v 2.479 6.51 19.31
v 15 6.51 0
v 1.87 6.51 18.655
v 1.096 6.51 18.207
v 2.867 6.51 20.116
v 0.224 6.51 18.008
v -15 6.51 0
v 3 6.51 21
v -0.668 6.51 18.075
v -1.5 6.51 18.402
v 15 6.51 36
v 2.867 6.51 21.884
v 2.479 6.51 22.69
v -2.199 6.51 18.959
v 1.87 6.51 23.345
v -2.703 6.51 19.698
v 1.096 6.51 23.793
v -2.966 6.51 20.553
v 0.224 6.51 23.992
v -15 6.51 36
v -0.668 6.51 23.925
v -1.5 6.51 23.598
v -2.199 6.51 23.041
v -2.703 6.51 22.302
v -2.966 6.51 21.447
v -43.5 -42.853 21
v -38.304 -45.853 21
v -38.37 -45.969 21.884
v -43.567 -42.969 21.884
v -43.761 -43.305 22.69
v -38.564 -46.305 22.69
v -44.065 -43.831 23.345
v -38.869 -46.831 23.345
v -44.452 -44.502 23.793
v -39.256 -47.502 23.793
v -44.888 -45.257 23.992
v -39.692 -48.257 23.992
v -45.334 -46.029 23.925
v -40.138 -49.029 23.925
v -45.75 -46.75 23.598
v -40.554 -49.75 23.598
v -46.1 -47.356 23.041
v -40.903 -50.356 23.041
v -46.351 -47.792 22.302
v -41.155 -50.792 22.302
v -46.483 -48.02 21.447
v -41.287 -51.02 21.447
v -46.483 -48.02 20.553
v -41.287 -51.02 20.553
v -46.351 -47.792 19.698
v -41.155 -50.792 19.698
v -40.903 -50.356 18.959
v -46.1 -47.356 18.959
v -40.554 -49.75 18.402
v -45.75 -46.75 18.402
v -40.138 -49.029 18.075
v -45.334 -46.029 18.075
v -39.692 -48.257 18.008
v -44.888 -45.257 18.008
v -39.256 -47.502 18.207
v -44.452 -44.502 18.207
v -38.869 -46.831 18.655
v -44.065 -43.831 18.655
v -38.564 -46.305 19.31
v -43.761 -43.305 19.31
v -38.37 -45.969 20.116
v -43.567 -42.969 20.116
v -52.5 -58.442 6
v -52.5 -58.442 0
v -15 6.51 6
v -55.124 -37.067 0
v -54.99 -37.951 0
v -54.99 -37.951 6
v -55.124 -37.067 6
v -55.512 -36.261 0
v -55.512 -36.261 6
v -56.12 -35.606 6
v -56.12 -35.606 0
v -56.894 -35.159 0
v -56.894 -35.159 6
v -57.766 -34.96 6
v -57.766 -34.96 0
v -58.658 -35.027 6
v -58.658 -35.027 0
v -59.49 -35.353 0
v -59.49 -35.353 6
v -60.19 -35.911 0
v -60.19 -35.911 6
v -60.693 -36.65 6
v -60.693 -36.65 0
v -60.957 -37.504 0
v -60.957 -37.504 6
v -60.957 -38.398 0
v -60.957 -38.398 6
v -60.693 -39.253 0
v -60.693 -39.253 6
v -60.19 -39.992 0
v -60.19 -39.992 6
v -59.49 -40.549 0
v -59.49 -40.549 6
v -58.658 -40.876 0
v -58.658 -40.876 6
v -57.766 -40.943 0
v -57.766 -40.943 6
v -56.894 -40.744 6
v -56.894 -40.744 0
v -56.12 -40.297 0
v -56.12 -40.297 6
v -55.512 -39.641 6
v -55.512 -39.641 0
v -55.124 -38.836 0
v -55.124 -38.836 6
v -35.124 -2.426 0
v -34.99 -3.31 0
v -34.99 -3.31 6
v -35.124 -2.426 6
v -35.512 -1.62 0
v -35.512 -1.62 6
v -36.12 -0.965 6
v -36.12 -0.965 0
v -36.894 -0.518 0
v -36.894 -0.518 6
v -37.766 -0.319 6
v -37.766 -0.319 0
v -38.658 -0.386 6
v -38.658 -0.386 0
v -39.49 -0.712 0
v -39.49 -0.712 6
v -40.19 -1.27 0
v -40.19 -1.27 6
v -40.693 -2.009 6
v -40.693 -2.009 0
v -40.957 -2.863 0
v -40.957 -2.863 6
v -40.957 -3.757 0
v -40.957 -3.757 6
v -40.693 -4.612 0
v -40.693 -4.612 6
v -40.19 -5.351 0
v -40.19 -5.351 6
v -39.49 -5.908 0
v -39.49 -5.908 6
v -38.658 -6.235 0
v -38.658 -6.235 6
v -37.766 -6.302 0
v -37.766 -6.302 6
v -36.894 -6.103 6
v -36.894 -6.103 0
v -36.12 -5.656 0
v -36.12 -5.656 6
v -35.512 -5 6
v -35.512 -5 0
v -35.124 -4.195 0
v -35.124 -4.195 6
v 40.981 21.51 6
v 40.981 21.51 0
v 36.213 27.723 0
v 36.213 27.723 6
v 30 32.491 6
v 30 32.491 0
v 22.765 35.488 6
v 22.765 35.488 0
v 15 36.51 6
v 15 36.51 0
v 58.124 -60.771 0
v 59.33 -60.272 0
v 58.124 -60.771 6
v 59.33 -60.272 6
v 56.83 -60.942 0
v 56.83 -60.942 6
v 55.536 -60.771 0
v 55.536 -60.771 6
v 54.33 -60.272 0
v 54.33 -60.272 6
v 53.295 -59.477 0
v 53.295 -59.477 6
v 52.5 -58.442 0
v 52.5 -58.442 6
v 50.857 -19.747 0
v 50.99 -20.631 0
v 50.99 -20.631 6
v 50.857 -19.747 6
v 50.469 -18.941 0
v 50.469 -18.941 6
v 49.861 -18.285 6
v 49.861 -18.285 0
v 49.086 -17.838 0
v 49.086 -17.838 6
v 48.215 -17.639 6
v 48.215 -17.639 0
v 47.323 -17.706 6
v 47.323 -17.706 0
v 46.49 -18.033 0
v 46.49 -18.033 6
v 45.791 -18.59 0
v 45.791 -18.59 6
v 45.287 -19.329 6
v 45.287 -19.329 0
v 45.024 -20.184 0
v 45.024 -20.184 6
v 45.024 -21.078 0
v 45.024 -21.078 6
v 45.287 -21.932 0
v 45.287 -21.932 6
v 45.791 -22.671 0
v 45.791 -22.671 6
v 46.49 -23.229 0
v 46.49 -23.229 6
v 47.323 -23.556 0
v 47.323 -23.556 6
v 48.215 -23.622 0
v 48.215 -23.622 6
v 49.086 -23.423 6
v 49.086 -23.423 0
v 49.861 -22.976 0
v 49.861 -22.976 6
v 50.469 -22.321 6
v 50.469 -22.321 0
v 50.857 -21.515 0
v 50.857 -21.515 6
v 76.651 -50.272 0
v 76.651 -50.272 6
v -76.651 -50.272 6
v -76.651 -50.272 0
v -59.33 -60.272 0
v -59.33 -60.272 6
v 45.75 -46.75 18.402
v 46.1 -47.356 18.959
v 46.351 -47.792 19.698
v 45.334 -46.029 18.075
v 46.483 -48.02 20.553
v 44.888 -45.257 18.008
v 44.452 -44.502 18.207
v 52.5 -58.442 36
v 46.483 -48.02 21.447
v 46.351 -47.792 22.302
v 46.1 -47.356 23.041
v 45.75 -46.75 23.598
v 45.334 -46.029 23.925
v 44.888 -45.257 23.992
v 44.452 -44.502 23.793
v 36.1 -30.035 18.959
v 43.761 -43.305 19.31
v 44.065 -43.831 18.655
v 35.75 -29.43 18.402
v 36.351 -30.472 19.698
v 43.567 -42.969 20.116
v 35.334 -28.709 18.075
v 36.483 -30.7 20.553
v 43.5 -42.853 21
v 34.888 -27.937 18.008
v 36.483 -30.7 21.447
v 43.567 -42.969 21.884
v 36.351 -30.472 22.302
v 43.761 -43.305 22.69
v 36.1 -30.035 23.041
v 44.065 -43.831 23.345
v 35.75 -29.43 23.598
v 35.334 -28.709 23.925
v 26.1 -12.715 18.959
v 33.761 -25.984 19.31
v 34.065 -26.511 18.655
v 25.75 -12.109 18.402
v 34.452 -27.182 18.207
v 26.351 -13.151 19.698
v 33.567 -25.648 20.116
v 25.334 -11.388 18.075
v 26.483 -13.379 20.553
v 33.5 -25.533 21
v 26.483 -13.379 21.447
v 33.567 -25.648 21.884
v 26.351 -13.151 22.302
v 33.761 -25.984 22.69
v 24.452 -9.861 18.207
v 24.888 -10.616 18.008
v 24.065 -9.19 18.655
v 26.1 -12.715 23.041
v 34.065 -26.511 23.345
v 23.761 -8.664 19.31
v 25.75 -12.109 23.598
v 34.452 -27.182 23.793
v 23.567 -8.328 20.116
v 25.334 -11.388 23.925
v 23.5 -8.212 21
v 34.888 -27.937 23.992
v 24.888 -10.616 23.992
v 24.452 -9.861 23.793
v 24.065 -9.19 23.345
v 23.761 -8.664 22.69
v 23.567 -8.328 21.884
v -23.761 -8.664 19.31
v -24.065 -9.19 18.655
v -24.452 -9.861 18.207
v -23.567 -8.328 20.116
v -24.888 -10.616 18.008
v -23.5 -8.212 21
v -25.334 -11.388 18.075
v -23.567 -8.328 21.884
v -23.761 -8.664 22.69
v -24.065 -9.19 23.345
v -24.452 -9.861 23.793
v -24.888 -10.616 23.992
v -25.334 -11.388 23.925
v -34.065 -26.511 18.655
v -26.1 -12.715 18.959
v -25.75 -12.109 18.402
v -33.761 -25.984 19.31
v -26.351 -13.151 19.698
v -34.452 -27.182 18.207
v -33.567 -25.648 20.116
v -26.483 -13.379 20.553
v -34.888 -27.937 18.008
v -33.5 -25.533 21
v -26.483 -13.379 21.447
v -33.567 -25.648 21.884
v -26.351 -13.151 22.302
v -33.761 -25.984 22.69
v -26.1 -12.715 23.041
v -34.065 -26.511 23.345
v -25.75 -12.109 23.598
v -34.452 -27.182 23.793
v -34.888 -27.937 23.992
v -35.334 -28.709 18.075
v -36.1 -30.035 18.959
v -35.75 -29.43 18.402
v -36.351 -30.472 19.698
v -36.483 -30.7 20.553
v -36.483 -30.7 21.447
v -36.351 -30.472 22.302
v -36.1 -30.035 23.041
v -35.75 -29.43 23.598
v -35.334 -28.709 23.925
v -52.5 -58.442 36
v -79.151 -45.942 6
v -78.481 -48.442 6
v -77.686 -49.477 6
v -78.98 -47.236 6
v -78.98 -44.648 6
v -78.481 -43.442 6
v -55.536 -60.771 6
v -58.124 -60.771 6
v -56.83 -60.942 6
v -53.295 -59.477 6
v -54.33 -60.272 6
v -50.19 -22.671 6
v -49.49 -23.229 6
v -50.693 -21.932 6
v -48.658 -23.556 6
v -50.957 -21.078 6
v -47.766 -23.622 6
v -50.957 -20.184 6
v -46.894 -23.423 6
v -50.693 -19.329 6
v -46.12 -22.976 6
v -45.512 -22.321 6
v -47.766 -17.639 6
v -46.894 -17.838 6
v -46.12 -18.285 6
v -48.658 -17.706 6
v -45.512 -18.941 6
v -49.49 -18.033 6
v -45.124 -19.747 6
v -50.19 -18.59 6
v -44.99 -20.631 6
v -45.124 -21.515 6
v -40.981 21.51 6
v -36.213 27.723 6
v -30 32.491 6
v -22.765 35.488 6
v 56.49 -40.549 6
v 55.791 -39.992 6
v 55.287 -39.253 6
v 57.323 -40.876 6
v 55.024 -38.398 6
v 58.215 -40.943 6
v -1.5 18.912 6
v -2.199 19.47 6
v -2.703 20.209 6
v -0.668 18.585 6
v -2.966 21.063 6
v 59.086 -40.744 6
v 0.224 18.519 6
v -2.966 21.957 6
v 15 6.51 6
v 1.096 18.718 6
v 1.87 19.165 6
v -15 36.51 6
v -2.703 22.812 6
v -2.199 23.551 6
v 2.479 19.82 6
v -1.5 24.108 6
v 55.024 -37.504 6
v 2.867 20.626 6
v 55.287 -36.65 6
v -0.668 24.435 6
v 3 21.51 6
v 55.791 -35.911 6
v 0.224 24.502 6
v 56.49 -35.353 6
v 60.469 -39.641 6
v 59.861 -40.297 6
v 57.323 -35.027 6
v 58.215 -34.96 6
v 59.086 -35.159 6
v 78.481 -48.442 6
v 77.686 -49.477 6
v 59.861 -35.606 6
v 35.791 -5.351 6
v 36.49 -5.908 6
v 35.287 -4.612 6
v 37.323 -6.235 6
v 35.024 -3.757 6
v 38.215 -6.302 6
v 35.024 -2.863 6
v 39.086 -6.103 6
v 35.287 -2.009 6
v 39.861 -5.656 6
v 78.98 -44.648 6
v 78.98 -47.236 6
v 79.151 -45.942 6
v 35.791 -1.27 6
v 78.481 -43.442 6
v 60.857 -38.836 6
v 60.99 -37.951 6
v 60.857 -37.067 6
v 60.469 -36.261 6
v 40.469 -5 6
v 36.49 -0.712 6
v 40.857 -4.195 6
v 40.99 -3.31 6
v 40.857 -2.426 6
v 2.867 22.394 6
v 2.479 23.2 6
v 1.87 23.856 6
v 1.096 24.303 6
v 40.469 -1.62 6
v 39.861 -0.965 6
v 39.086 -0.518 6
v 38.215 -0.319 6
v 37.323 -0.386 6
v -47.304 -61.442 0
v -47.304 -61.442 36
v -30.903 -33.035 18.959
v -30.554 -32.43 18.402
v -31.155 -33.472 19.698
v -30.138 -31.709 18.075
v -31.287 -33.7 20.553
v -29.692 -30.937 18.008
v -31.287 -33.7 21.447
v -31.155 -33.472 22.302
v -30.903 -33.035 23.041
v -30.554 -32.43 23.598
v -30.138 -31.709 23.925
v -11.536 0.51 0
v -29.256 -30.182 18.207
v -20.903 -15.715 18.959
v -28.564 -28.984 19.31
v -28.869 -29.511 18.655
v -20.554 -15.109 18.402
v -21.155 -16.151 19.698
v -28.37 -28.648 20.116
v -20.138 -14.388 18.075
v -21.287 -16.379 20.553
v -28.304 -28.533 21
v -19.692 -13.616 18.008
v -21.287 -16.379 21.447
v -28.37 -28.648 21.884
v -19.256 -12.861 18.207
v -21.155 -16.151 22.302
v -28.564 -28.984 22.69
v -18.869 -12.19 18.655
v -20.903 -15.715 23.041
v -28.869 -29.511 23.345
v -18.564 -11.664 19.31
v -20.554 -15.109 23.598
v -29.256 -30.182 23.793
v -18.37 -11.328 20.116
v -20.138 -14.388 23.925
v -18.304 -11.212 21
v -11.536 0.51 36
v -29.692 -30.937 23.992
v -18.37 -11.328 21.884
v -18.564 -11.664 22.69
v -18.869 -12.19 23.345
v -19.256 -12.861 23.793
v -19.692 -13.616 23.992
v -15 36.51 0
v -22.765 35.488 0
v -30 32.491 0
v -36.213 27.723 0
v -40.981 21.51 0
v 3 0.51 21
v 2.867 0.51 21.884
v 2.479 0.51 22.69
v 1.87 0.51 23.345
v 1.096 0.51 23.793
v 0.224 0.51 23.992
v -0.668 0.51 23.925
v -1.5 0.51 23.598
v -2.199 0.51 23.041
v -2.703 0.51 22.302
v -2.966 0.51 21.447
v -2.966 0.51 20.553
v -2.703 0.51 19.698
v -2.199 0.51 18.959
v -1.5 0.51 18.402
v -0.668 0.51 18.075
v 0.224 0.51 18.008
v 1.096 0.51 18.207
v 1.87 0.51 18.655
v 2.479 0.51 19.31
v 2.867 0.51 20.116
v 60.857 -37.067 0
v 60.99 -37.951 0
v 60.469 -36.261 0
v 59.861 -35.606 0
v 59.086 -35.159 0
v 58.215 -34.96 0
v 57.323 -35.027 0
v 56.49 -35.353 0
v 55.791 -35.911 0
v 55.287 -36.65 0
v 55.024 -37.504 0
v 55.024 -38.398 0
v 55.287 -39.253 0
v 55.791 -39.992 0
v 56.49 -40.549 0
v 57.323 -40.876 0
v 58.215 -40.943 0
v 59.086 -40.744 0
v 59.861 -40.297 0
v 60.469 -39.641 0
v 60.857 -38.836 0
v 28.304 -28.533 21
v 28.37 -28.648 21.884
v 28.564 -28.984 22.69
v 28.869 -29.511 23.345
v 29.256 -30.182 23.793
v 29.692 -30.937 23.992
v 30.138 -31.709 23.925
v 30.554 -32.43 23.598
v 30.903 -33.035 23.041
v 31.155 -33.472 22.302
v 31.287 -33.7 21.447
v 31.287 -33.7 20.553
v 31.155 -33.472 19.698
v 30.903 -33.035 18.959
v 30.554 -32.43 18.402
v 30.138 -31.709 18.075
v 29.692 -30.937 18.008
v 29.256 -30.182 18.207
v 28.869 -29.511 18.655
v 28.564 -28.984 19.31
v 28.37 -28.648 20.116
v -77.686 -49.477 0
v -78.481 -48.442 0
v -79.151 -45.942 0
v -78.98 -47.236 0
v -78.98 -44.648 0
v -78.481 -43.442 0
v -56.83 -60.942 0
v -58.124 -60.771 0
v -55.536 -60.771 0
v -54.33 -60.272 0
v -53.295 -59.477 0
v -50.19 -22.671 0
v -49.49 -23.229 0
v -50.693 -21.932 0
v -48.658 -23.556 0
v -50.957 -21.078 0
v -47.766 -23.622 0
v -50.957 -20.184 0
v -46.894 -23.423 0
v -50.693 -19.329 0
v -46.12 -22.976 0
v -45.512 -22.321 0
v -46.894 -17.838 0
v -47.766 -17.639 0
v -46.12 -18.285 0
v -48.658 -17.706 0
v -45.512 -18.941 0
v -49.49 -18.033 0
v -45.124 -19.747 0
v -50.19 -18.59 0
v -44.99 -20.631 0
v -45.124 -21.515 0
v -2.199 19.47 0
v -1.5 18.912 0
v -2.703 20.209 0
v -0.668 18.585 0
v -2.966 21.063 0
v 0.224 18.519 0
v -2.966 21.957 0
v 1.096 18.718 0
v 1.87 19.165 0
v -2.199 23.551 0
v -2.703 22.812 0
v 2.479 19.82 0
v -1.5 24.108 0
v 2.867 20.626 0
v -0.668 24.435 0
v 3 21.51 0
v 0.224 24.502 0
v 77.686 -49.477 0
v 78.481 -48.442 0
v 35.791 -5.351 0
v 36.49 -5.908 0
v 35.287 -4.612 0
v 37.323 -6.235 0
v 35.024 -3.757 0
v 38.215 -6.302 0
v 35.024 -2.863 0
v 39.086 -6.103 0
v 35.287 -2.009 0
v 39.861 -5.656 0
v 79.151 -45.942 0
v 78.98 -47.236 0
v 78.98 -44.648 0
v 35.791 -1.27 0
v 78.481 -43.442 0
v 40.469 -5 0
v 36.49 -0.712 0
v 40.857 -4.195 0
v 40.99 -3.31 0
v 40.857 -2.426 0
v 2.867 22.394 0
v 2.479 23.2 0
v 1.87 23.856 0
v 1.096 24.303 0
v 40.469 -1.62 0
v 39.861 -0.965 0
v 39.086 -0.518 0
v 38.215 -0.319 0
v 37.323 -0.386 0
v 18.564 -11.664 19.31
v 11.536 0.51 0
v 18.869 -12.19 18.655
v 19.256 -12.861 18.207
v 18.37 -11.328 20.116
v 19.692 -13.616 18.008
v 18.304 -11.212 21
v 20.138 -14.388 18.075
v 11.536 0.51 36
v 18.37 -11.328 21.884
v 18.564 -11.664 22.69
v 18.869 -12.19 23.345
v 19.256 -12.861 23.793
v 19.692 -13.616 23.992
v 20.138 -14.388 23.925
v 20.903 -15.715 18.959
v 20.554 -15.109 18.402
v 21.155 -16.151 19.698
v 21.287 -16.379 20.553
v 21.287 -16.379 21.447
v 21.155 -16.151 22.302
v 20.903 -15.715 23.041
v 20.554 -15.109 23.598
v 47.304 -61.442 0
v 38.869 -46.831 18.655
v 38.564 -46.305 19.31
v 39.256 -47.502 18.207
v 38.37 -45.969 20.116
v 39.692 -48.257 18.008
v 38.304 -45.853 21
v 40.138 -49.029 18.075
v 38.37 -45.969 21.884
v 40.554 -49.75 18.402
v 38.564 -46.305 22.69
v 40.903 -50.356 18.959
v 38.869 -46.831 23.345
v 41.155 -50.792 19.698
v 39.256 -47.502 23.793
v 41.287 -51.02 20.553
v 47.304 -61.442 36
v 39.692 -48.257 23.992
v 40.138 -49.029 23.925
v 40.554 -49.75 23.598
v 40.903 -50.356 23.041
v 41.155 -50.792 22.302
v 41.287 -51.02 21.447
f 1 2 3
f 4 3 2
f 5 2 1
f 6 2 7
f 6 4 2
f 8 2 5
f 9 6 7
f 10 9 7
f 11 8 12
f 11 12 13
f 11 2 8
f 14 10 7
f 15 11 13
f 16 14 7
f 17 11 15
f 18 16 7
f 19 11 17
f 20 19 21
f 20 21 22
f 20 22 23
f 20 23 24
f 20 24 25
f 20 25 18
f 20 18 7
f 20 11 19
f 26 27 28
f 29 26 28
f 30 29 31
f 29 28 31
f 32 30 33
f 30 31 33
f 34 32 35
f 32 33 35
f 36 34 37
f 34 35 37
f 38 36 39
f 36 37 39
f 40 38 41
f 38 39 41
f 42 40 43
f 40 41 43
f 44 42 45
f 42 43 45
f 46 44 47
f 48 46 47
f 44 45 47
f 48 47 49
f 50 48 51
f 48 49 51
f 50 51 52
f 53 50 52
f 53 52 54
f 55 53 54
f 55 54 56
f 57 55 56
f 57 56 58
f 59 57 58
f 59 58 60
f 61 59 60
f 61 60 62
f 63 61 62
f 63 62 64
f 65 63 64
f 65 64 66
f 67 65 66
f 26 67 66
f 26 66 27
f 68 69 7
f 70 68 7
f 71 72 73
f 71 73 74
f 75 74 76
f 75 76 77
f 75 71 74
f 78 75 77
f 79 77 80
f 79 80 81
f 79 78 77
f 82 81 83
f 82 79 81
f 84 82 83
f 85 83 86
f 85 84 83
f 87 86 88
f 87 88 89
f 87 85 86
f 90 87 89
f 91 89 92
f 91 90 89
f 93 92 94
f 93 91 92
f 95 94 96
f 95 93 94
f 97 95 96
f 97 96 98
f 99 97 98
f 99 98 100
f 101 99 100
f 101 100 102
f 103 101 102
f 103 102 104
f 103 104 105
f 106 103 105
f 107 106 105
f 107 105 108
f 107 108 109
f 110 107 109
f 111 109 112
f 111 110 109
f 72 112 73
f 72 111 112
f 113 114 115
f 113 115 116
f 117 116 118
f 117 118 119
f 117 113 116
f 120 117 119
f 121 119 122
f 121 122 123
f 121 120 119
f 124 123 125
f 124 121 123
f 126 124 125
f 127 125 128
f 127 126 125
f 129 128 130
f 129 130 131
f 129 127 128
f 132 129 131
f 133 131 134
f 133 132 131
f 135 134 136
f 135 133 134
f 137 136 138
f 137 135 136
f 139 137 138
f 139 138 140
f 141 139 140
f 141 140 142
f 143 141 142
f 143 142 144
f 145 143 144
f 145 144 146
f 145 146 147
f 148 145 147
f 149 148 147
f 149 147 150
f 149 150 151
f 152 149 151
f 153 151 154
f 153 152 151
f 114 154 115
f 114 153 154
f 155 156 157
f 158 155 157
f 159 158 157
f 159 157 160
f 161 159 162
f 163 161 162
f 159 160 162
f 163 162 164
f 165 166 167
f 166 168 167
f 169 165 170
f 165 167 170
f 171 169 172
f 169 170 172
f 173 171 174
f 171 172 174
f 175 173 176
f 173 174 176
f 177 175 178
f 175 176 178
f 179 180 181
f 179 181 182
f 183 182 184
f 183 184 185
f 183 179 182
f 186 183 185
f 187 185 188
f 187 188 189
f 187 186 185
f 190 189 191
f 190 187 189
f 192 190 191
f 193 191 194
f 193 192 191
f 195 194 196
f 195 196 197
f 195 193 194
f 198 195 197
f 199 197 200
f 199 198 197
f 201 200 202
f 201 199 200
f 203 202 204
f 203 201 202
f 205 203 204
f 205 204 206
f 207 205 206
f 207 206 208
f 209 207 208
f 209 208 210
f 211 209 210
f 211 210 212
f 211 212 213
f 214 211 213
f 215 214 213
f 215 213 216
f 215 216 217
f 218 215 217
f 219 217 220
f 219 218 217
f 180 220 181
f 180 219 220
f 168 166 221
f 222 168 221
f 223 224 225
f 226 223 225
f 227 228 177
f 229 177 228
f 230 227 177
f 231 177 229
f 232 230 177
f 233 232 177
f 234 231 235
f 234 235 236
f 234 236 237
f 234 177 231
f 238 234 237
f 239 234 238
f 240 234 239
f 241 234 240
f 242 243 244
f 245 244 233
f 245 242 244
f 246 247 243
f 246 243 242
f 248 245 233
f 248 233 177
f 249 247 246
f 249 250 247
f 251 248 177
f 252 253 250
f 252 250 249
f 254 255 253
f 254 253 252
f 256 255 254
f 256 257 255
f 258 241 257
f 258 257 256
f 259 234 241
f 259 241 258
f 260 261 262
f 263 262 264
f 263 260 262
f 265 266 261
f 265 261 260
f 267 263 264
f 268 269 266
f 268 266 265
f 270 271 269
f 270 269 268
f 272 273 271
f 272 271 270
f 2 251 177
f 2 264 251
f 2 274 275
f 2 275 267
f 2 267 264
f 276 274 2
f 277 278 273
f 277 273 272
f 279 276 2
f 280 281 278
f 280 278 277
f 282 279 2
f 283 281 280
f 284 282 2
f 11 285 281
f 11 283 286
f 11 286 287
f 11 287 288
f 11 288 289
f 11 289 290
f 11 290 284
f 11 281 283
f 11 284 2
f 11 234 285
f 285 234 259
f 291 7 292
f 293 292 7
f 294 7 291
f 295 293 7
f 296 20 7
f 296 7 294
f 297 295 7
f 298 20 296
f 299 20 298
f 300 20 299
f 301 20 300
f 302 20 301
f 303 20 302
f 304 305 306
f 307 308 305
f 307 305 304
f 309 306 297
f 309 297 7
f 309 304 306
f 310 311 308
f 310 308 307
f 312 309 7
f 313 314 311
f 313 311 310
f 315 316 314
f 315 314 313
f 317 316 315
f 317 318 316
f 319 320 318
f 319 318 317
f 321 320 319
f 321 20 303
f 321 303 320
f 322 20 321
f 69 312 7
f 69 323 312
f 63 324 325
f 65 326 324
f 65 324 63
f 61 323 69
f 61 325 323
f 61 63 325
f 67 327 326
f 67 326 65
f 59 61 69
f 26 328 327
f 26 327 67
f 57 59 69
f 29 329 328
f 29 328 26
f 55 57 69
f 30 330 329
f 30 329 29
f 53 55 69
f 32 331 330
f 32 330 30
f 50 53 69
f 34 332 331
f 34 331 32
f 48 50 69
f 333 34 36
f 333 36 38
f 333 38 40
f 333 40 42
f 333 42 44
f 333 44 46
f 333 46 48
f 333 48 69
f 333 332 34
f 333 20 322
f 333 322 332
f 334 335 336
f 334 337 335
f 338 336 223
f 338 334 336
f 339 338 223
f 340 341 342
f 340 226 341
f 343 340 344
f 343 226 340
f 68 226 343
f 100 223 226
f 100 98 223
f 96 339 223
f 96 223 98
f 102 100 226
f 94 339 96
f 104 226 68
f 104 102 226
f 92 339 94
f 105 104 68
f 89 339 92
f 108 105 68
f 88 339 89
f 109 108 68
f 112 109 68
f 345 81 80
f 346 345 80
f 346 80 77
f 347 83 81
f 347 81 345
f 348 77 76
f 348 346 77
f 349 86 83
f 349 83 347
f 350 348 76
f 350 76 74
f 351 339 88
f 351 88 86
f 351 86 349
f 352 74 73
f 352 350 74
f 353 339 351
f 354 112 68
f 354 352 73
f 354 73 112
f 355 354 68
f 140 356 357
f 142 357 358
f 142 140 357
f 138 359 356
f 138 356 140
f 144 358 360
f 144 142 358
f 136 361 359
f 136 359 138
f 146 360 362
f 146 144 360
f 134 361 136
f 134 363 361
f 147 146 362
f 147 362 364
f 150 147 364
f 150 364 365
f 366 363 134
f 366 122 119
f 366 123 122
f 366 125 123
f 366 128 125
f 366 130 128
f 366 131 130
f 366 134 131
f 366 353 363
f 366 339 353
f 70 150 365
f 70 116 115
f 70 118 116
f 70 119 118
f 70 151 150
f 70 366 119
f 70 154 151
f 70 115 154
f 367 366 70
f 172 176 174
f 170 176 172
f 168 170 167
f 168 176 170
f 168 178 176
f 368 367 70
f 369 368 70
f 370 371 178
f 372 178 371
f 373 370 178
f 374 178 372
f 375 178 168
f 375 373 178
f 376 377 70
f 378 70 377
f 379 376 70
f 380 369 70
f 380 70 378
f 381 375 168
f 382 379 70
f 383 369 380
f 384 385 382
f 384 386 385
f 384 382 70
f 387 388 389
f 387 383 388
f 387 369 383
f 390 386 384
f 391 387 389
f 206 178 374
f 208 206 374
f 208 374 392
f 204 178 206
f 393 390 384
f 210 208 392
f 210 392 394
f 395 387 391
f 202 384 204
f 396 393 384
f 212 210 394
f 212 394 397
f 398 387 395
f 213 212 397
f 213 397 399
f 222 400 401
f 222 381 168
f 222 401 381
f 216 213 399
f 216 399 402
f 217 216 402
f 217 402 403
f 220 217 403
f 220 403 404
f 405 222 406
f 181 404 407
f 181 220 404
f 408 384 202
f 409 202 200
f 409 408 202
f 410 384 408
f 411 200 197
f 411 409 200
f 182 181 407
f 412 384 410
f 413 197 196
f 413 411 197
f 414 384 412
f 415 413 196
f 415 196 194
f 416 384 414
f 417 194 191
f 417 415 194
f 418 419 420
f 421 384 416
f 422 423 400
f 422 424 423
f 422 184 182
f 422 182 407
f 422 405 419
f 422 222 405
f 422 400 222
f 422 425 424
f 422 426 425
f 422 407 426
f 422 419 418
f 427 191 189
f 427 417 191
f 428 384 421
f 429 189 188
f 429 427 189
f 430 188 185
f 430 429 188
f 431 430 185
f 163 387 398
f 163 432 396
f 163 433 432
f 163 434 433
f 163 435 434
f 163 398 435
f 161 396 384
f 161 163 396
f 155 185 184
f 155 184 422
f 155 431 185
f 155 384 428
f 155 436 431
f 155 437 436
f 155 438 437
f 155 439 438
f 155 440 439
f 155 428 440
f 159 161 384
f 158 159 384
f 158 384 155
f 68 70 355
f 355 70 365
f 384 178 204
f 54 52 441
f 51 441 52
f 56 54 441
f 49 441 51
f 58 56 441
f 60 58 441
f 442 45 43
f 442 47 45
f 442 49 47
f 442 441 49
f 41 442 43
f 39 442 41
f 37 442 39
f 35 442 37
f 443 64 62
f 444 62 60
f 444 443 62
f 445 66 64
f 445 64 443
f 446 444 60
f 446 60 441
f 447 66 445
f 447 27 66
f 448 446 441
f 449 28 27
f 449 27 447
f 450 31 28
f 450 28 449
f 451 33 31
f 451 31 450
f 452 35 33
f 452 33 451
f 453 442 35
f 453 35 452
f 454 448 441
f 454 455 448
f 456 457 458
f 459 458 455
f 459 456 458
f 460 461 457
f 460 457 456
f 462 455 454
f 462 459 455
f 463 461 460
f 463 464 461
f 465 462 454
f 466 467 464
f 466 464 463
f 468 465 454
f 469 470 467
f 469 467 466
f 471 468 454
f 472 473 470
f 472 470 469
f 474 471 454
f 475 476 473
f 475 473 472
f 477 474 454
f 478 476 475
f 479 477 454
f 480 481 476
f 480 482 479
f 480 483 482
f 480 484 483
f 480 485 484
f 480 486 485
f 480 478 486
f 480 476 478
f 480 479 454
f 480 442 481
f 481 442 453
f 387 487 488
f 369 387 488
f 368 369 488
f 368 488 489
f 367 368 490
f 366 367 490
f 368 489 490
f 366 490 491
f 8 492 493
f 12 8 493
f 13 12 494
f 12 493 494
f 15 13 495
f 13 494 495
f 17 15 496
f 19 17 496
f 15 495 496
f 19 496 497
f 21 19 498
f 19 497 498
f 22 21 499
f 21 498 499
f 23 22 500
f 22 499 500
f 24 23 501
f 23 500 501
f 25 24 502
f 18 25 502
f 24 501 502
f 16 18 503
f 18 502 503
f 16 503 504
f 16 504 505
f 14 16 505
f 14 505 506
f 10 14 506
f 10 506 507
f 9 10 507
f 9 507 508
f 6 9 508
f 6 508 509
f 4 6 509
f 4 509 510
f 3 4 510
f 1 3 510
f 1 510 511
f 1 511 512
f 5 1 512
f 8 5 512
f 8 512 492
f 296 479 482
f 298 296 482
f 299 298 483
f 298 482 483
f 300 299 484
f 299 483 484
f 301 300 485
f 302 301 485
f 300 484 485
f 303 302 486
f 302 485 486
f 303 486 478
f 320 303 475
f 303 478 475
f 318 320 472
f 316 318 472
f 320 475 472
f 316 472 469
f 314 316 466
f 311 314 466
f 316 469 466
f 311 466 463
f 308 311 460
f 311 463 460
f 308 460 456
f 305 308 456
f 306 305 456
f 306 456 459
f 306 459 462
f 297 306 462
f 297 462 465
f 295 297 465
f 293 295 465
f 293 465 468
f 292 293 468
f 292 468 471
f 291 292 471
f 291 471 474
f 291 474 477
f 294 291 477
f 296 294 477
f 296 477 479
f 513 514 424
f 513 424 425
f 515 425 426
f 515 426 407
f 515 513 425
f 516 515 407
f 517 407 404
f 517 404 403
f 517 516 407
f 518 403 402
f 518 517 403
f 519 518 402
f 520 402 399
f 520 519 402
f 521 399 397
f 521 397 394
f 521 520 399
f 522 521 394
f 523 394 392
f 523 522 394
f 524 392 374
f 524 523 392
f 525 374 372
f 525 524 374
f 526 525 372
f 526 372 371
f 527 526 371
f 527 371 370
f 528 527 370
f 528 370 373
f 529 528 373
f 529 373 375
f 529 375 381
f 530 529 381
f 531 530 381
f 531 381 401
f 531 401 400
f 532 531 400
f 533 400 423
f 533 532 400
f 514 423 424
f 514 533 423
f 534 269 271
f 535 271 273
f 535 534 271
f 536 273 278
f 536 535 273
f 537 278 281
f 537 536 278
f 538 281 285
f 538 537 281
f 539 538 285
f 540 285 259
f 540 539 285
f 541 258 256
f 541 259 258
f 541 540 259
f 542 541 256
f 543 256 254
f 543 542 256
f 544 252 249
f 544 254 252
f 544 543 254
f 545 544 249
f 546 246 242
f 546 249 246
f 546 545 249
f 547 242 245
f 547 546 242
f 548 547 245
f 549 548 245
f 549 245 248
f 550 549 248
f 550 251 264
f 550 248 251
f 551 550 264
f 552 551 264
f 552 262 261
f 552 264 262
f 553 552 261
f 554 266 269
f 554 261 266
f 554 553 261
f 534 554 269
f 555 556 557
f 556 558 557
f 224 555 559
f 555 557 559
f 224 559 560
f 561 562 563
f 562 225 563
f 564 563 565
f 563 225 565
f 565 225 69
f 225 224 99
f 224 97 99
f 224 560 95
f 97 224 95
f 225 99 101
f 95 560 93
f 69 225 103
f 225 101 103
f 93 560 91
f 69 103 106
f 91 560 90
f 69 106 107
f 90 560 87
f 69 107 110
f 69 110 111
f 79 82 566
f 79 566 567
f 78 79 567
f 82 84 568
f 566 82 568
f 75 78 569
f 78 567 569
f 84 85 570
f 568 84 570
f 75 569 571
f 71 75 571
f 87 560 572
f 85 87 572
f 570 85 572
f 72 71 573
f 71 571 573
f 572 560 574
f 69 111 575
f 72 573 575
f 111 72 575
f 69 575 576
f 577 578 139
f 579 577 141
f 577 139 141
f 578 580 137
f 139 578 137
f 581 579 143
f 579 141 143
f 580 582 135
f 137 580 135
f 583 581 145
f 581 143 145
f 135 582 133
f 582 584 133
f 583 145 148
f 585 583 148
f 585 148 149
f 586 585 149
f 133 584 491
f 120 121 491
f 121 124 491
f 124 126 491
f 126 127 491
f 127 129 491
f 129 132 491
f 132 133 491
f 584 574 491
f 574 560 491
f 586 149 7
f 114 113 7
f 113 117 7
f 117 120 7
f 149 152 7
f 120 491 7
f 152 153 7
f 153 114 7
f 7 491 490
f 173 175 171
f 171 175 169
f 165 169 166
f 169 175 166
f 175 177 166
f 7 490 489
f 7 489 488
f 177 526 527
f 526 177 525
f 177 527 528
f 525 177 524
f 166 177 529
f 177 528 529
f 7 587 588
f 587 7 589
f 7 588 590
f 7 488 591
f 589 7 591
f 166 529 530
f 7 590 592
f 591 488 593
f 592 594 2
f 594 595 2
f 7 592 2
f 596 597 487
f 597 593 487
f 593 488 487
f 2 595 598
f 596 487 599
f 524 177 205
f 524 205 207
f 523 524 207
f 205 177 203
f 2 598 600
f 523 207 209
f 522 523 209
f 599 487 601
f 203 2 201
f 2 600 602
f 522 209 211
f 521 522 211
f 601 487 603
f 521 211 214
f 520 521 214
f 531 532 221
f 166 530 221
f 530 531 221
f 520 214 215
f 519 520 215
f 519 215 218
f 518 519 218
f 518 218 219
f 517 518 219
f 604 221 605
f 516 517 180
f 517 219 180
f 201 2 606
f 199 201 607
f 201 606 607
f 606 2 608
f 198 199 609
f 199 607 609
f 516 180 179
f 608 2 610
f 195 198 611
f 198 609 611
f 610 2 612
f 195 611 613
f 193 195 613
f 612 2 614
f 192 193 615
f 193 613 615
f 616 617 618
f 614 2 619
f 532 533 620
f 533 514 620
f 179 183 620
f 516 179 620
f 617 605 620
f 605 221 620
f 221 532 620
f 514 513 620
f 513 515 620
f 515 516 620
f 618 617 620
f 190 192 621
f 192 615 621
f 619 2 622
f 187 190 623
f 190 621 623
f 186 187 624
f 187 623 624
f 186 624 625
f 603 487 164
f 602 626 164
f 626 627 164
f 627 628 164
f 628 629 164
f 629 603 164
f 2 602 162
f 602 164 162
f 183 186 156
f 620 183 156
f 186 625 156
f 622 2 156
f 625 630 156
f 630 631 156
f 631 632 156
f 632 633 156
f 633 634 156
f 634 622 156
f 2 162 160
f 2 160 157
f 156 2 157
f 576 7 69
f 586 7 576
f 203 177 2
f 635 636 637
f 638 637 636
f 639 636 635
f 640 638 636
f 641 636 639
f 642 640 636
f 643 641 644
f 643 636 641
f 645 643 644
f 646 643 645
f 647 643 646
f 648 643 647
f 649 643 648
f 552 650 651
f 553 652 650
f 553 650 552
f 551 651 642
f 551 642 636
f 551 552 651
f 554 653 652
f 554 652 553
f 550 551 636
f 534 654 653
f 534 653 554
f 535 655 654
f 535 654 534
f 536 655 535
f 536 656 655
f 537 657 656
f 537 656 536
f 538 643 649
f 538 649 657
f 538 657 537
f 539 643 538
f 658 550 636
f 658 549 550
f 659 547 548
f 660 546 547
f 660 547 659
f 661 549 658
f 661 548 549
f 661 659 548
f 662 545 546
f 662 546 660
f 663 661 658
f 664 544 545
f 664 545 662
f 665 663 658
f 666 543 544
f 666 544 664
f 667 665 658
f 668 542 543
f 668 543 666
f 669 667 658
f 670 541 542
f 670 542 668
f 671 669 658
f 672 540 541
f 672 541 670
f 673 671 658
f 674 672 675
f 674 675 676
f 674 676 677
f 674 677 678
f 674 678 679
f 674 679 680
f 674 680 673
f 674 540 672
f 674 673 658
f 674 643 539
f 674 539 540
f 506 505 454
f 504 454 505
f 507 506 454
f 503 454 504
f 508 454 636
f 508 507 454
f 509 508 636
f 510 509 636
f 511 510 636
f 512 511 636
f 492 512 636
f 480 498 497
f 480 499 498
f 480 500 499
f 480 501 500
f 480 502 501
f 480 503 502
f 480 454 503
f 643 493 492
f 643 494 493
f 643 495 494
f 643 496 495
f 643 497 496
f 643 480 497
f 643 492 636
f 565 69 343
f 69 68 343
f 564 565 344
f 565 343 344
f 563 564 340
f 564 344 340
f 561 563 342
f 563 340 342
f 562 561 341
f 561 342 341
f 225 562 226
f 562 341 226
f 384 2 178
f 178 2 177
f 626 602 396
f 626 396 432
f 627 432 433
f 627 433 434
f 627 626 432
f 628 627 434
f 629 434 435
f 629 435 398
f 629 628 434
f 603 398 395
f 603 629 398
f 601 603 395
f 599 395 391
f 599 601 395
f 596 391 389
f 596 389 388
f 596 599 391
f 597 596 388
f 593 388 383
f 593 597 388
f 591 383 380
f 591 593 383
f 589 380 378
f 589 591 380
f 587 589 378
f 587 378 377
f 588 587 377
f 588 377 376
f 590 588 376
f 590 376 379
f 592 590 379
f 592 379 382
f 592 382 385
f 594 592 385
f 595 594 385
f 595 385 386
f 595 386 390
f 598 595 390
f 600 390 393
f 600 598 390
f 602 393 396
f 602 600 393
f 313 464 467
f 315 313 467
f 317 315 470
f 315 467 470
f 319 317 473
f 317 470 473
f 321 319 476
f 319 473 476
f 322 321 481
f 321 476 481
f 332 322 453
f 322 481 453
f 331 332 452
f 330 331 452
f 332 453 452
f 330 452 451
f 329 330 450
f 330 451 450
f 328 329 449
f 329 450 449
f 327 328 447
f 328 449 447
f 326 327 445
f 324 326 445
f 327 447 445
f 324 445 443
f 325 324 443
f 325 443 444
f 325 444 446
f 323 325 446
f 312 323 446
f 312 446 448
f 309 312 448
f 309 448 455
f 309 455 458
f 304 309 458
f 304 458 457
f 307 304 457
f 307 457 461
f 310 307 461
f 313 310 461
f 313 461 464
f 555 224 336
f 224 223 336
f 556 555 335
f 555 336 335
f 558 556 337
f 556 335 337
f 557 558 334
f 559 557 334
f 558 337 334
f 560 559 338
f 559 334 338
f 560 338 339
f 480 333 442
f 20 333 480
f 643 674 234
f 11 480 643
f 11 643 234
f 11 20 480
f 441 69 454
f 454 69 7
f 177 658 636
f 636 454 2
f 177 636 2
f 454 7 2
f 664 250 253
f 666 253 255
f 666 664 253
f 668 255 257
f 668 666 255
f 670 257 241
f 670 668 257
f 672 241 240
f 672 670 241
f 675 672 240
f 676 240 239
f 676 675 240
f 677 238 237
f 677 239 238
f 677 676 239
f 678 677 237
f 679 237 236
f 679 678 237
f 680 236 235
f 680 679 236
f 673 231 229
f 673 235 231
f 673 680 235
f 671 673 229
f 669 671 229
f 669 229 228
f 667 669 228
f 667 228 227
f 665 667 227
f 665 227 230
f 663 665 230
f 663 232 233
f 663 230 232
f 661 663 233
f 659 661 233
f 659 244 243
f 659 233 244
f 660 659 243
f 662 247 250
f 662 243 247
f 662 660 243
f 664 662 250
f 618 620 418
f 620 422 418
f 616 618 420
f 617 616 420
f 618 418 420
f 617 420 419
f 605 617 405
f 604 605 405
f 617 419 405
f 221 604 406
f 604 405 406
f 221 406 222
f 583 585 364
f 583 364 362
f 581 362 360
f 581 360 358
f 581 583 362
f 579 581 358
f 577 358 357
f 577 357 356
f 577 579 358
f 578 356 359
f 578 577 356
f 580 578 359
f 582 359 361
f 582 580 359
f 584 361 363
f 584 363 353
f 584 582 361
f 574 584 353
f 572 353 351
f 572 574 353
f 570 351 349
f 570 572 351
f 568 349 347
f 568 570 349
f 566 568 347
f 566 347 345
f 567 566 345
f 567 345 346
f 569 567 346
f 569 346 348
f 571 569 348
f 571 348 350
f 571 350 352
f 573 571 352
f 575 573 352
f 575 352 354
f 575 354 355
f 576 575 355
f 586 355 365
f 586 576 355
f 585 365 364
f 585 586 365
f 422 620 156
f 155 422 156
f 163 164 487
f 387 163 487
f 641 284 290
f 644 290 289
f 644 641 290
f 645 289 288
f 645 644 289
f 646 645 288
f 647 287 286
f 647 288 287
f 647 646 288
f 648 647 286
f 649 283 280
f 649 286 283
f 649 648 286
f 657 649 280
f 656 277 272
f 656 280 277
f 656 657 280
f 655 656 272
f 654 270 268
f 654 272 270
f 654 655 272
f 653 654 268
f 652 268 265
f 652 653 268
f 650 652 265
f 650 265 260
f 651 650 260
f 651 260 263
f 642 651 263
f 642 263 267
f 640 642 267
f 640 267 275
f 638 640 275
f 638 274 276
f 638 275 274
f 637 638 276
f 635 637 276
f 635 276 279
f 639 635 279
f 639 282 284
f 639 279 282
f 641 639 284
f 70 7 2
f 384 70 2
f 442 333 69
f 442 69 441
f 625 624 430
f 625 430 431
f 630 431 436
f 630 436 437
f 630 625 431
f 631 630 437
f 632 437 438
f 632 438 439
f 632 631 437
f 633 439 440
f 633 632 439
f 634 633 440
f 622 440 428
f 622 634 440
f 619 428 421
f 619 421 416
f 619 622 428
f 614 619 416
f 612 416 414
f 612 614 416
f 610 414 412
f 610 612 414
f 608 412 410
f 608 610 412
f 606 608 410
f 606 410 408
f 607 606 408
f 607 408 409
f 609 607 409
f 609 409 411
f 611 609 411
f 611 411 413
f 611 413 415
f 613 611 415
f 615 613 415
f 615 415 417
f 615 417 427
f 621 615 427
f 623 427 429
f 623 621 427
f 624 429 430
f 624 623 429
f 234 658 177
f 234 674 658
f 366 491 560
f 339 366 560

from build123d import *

# Parameters (mm, degrees)
F0_R          = 3
F1_DEPTH      = 6
F2_R          = 5
F3_R          = 5
F4_R          = 5
F5_R          = 5
F7_DEPTH      = 30
F7_DEPTH_BACK = 6
F8_R          = 3
F9_DEPTH      = 76.5570802573
F10_R         = 3
F11_DEPTH     = 36.0010005965


# Not quite as in the source:
# - a pattern or mirror of a feature is missing from the dataset's text; its kind, count and spacing are read off the source's solid


with BuildPart() as f1:
    # F0 (on Top) → F1 (new body)
    with BuildSketch(Plane.XY):
        with BuildLine():
            Line((15, 36.5101838864), (-15, 36.5101838864))
            ThreePointArc((-15, 36.5101838864), (-30, 32.490946), (-40.9807621135, 21.5101838864))
            Line((-40.9807621135, 21.5101838864), (-80.9807621135, -47.7718484163))
            Line((-80.9807621135, -47.7718484163), (-55, -62.7718484163))
            Line((-55, -62.7718484163), (-15, 6.5101838864))
            Line((-15, 6.5101838864), (15, 6.5101838864))
            Line((15, 6.5101838864), (55, -62.7718484163))
            Line((55, -62.7718484163), (80.9807621135, -47.7718484163))
            Line((80.9807621135, -47.7718484163), (40.9807621135, 21.5101838864))
            ThreePointArc((40.9807621135, 21.5101838864), (30, 32.490946), (15, 36.5101838864))
        make_face()
        with Locations((-57.9903810568, -37.9513403406)):
            Circle(F0_R, mode=Mode.SUBTRACT)
        with Locations((-47.9903810568, -20.6308322649)):
            Circle(F0_R, mode=Mode.SUBTRACT)
        with Locations((57.9903810568, -37.9513403406)):
            Circle(F0_R, mode=Mode.SUBTRACT)
        with Locations((47.9903810568, -20.6308322649)):
            Circle(F0_R, mode=Mode.SUBTRACT)
        with Locations((-37.9903810568, -3.3103241892)):
            Circle(F0_R, mode=Mode.SUBTRACT)
        with Locations((37.9903810568, -3.3103241892)):
            Circle(F0_R, mode=Mode.SUBTRACT)
        with Locations((0, 21.5101838864)):
            Circle(F0_R, mode=Mode.SUBTRACT)
    extrude(amount=F1_DEPTH)

    # F2
    f2_edges = [f1.edges().sort_by_distance(p)[0] for p in [
        (80.980762, -47.771848, 3),
    ]]
    fillet(f2_edges, radius=F2_R)

    # F3
    f3_edges = [f1.edges().sort_by_distance(p)[0] for p in [
        (55, -62.771848, 3),
    ]]
    fillet(f3_edges, radius=F3_R)

    # F4
    f4_edges = [f1.edges().sort_by_distance(p)[0] for p in [
        (-55, -62.771848, 3),
    ]]
    fillet(f4_edges, radius=F4_R)

    # F5
    f5_edges = [f1.edges().sort_by_distance(p)[0] for p in [
        (-80.980762, -47.771848, 3),
    ]]
    fillet(f5_edges, radius=F5_R)


with BuildPart() as f7:
    # F6 (on face) → F7 (new body, two sides)
    with BuildSketch(Plane.XY.offset(6)) as f7_sk:
        Polygon((52.5, -58.4417213974), (15, 6.5101838864), (-15, 6.5101838864), (-52.5, -58.4417213974), (-47.3038470608, -61.4417216956), (-11.5358980405, 0.51018329), (11.5358980405, 0.51018329), (47.3038470608, -61.4417216956), align=None)
    extrude(amount=F7_DEPTH)
    extrude(f7_sk.sketch, amount=-F7_DEPTH_BACK)

    # F8 (on face) → F9 (cut, through all)
    with BuildSketch(Plane(origin=(-8.8728393752, 5.1227362018, 0), x_dir=(0.5, 0.8660254038, 0), z_dir=(0.8660254038, -0.5, 0))):
        with Locations((-61.862015371, 21)):
            Circle(F8_R)
        with Locations((-41.862015371, 21)):
            Circle(F8_R)
        with Locations((-21.862015371, 21)):
            Circle(F8_R)
    f9 = extrude(amount=-F9_DEPTH, mode=Mode.SUBTRACT)

    # F9_copies: F9 across plane
    add(f9.mirror(Plane(origin=(0, 0, 0), x_dir=(0, 0, 1), z_dir=(1, 0, 0))), mode=Mode.SUBTRACT)

    # F10 (on face) → F11 (cut, through all)
    with BuildSketch(Plane.XZ.offset(-0.51018329)):
        with Locations((0, 21)):
            Circle(F10_R)
    extrude(amount=-F11_DEPTH, mode=Mode.SUBTRACT)


solid = Compound([f1.part, f7.part])
